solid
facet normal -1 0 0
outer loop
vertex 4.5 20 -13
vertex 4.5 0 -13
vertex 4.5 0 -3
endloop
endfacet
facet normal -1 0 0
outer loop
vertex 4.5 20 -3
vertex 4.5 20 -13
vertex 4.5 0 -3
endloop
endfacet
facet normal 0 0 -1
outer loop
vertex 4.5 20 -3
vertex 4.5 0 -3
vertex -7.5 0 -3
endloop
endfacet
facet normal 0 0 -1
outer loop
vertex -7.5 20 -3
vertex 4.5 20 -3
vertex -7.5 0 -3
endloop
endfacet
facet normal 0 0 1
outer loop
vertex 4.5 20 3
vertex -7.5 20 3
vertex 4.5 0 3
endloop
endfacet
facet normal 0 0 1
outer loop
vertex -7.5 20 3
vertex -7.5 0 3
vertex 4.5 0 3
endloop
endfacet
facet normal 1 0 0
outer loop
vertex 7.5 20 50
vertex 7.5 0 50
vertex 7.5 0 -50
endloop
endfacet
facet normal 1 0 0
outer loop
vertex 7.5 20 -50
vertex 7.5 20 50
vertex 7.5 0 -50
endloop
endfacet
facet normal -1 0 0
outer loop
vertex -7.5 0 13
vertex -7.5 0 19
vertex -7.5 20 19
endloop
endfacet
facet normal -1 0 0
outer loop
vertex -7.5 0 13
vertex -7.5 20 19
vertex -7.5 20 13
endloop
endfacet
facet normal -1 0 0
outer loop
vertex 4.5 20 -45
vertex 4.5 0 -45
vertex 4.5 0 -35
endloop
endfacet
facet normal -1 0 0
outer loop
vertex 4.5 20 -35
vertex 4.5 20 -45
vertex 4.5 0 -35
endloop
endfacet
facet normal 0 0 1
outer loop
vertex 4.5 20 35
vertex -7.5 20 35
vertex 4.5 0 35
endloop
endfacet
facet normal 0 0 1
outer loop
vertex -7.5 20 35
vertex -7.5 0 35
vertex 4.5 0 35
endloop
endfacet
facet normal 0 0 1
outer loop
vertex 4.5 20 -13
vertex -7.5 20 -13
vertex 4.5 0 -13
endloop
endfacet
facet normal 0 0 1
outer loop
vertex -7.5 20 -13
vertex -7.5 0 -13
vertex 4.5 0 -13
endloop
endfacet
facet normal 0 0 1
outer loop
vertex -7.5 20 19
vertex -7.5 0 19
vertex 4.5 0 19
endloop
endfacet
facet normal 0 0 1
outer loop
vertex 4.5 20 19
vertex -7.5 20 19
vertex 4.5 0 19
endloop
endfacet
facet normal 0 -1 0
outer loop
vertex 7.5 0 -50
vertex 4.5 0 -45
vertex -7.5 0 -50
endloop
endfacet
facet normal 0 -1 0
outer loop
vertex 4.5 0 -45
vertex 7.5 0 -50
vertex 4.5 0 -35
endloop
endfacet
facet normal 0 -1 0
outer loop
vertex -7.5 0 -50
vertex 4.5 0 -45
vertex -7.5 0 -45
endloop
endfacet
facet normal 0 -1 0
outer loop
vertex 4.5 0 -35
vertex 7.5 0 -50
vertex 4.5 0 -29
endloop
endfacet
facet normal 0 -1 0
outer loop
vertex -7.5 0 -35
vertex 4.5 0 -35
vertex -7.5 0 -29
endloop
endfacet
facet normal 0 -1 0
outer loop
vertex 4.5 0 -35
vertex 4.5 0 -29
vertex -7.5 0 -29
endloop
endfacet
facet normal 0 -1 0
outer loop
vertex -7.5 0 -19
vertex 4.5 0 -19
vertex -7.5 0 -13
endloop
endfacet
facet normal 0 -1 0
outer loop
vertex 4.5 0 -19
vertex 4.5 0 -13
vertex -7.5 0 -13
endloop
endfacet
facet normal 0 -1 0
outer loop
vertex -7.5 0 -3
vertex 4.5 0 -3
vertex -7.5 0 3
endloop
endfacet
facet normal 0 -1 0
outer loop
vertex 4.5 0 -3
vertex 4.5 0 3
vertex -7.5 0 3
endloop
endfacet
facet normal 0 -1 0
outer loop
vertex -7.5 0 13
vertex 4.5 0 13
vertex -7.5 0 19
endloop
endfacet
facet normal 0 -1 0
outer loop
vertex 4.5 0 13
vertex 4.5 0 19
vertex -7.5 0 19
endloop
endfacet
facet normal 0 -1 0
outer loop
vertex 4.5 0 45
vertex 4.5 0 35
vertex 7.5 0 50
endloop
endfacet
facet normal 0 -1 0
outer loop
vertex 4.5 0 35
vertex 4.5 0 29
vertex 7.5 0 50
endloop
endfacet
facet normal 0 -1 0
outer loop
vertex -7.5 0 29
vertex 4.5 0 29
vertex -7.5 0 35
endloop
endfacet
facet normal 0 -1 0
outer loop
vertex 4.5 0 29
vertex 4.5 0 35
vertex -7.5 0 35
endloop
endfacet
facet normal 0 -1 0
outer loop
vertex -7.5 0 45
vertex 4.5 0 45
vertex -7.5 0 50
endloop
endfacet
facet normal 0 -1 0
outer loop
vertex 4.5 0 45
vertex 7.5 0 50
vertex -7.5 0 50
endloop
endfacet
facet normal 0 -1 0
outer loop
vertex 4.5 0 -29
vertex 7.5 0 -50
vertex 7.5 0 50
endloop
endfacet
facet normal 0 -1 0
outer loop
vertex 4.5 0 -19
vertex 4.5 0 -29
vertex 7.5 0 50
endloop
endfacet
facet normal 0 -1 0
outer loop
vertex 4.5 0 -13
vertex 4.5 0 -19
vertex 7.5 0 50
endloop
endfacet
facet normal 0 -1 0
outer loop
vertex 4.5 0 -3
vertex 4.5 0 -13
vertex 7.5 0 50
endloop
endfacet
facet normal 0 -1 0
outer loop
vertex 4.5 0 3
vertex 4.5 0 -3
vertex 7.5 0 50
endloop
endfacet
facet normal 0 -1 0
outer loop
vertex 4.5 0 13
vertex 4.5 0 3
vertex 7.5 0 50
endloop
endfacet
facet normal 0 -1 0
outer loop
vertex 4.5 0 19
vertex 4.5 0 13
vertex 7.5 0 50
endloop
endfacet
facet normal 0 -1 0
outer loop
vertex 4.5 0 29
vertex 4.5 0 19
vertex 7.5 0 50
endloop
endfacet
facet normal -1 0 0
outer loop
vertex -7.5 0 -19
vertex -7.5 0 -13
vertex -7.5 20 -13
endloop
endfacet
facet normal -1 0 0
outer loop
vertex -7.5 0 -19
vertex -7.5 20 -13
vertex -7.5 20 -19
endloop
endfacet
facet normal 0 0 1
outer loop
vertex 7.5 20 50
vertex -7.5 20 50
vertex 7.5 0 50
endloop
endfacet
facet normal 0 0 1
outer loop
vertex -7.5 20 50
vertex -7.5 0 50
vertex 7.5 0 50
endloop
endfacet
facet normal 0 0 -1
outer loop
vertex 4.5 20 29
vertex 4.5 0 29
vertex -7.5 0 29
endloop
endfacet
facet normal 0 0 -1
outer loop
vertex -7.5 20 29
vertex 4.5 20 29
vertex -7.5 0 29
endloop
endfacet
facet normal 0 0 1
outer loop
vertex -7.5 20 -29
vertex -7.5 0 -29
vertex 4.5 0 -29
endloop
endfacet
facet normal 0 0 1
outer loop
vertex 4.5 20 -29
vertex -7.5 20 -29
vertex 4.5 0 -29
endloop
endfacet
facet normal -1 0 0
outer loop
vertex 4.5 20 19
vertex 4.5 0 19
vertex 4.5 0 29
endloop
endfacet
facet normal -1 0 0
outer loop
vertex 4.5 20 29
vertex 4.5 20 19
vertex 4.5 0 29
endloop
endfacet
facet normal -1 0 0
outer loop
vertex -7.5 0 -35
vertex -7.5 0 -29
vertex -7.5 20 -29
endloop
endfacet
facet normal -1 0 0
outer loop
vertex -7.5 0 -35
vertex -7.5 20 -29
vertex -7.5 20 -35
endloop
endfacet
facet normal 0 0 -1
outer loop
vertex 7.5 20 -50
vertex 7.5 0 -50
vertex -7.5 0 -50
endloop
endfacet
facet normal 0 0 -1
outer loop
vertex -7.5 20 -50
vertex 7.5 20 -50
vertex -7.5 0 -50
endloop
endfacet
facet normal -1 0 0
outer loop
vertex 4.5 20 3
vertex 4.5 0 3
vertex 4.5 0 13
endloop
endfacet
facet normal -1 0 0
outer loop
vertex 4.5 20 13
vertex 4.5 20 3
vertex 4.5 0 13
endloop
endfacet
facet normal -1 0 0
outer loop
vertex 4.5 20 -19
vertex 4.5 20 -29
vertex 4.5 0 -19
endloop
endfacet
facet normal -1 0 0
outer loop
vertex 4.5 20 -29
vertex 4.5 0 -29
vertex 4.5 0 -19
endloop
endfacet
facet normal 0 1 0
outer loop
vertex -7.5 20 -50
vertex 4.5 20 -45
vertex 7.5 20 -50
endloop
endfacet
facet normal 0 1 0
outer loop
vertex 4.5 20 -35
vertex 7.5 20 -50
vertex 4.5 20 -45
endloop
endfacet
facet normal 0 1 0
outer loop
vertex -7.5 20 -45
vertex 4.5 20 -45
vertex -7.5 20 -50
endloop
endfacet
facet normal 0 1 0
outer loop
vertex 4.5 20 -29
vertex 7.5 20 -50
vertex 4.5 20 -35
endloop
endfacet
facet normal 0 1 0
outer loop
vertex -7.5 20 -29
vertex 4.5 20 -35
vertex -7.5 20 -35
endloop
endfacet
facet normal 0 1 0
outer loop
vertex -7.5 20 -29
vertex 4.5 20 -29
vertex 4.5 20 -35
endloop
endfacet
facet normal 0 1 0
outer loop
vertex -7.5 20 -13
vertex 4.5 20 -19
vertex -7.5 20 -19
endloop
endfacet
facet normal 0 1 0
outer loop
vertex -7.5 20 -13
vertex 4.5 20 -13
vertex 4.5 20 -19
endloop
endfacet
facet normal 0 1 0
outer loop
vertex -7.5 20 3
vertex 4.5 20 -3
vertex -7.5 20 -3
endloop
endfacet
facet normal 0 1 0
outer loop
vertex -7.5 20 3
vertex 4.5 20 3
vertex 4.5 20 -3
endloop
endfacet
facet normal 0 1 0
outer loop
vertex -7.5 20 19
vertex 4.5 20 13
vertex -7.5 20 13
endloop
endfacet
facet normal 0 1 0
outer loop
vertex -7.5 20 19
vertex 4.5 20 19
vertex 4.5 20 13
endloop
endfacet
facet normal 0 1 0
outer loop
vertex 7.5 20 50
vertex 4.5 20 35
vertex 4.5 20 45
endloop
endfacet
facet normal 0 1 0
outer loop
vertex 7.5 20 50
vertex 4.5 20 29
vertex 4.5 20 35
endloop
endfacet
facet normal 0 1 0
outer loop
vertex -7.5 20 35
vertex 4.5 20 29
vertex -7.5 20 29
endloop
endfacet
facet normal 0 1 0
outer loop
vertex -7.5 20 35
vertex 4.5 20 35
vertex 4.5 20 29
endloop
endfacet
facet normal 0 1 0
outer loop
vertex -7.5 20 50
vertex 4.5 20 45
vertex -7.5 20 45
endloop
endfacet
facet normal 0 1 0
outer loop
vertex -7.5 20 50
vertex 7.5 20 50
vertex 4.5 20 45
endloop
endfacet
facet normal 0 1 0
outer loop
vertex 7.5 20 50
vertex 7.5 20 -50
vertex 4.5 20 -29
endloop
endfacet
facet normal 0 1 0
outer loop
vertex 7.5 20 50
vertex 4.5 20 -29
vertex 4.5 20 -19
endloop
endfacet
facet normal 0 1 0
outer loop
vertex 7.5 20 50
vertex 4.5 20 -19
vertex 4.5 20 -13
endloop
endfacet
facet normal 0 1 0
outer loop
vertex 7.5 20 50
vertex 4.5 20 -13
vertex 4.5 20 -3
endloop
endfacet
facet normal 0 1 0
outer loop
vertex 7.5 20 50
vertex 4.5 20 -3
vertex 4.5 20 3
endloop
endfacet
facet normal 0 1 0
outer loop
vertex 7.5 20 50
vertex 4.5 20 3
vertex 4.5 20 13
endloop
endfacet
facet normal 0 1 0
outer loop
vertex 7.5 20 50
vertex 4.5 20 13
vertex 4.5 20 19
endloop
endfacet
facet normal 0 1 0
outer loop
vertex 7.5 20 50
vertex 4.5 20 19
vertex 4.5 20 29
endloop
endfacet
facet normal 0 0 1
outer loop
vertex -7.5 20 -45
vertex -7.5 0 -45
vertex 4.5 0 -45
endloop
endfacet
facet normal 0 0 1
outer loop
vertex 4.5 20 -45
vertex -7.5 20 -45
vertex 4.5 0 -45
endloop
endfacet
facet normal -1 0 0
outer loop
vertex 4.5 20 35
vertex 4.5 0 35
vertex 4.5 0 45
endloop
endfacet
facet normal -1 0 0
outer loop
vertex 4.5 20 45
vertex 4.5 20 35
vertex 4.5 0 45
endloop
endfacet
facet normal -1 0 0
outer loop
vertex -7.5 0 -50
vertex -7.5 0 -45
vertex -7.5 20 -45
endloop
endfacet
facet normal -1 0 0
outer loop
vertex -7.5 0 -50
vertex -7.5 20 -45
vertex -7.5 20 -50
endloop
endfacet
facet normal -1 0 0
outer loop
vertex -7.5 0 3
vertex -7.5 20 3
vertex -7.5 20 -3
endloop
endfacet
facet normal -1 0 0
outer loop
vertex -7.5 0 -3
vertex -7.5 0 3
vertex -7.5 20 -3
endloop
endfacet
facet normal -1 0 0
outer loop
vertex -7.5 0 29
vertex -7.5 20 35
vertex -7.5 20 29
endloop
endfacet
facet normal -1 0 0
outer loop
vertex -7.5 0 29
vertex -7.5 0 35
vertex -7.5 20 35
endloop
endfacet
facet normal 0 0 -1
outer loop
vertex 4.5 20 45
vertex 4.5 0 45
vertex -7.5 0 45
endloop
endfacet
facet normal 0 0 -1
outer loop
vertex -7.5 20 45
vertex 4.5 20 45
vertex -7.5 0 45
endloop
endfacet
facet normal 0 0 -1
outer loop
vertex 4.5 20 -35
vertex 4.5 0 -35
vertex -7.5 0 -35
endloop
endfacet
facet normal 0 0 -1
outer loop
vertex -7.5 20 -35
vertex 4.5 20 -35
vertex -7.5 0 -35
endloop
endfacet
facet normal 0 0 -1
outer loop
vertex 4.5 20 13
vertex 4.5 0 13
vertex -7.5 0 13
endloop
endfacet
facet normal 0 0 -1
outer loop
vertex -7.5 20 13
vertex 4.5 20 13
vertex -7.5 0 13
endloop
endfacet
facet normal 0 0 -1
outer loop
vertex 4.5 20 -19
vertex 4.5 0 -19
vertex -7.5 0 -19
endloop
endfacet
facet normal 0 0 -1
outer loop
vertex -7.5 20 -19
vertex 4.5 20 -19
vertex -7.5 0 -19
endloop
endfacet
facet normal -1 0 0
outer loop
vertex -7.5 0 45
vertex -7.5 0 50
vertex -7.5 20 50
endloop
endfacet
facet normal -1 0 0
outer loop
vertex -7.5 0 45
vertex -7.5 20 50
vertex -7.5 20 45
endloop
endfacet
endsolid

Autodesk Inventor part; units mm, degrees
ref_plane "YZ Plane" through (0, 0, 0) normal (1, 0, 0) x (0, 1, 0)
ref_plane "XZ Plane" through (0, 0, 0) normal (0, 1, 0) x (-1, 0, 0)
ref_plane "XY Plane" through (0, 0, 0) normal (0, 0, 1) x (1, 0, 0)
sketch "Sketch1" plane through (0, 0, 0) normal (0, 1, 0) x (-1, 0, 0)
  line L0 (7.5, 50) -> (-7.5, 50)
  line L1 (-7.5, 50) -> (-7.5, -50)
  line L2 (-7.5, -50) -> (7.5, -50)
  line L3 (7.5, -50) -> (7.5, 50) construction
  line L4 (7.5, 50) -> (-7.5, -50) construction
  line L5 (-7.5, 50) -> (7.5, -50) construction
  line L6 (7.5, 50) -> (7.5, 45)
  line L7 (7.5, 35) -> (-4.5, 35)
  line L8 (-4.5, 35) -> (-4.5, 45)
  line L9 (-4.5, 45) -> (7.5, 45)
  line L10 (7.5, 19) -> (-4.5, 19)
  line L11 (-4.5, 19) -> (-4.5, 29)
  line L12 (-4.5, 29) -> (7.5, 29)
  line L13 (7.5, 3) -> (-4.5, 3)
  line L14 (-4.5, 3) -> (-4.5, 13)
  line L15 (-4.5, 13) -> (7.5, 13)
  line L16 (7.5, -13) -> (-4.5, -13)
  line L17 (-4.5, -13) -> (-4.5, -3)
  line L18 (-4.5, -3) -> (7.5, -3)
  line L19 (7.5, -29) -> (-4.5, -29)
  line L20 (-4.5, -29) -> (-4.5, -19)
  line L21 (-4.5, -19) -> (7.5, -19)
  line L22 (7.5, -45) -> (-4.5, -45)
  line L23 (-4.5, -45) -> (-4.5, -35)
  line L24 (-4.5, -35) -> (7.5, -35)
  line L25 (7.5, 35) -> (7.5, 29)
  line L26 (7.5, 19) -> (7.5, 13)
  line L27 (7.5, 3) -> (7.5, -3)
  line L28 (7.5, -13) -> (7.5, -19)
  line L29 (7.5, -29) -> (7.5, -35)
  line L30 (7.5, -45) -> (7.5, -50)
  point P0 (0, 0)
  point P1 (7.5, 0)
  dimension "d0" = 15
  dimension "d1" = 100
  dimension "d4" = 5
  dimension "d5" = 10
  dimension "d6" = 12
  dimension "d9" = 16
  dimension "d14" = 10
extrude "Extrusion1" add sketch "Sketch1" along normal blind 20
properties part number "pneunet_approximate_test"
